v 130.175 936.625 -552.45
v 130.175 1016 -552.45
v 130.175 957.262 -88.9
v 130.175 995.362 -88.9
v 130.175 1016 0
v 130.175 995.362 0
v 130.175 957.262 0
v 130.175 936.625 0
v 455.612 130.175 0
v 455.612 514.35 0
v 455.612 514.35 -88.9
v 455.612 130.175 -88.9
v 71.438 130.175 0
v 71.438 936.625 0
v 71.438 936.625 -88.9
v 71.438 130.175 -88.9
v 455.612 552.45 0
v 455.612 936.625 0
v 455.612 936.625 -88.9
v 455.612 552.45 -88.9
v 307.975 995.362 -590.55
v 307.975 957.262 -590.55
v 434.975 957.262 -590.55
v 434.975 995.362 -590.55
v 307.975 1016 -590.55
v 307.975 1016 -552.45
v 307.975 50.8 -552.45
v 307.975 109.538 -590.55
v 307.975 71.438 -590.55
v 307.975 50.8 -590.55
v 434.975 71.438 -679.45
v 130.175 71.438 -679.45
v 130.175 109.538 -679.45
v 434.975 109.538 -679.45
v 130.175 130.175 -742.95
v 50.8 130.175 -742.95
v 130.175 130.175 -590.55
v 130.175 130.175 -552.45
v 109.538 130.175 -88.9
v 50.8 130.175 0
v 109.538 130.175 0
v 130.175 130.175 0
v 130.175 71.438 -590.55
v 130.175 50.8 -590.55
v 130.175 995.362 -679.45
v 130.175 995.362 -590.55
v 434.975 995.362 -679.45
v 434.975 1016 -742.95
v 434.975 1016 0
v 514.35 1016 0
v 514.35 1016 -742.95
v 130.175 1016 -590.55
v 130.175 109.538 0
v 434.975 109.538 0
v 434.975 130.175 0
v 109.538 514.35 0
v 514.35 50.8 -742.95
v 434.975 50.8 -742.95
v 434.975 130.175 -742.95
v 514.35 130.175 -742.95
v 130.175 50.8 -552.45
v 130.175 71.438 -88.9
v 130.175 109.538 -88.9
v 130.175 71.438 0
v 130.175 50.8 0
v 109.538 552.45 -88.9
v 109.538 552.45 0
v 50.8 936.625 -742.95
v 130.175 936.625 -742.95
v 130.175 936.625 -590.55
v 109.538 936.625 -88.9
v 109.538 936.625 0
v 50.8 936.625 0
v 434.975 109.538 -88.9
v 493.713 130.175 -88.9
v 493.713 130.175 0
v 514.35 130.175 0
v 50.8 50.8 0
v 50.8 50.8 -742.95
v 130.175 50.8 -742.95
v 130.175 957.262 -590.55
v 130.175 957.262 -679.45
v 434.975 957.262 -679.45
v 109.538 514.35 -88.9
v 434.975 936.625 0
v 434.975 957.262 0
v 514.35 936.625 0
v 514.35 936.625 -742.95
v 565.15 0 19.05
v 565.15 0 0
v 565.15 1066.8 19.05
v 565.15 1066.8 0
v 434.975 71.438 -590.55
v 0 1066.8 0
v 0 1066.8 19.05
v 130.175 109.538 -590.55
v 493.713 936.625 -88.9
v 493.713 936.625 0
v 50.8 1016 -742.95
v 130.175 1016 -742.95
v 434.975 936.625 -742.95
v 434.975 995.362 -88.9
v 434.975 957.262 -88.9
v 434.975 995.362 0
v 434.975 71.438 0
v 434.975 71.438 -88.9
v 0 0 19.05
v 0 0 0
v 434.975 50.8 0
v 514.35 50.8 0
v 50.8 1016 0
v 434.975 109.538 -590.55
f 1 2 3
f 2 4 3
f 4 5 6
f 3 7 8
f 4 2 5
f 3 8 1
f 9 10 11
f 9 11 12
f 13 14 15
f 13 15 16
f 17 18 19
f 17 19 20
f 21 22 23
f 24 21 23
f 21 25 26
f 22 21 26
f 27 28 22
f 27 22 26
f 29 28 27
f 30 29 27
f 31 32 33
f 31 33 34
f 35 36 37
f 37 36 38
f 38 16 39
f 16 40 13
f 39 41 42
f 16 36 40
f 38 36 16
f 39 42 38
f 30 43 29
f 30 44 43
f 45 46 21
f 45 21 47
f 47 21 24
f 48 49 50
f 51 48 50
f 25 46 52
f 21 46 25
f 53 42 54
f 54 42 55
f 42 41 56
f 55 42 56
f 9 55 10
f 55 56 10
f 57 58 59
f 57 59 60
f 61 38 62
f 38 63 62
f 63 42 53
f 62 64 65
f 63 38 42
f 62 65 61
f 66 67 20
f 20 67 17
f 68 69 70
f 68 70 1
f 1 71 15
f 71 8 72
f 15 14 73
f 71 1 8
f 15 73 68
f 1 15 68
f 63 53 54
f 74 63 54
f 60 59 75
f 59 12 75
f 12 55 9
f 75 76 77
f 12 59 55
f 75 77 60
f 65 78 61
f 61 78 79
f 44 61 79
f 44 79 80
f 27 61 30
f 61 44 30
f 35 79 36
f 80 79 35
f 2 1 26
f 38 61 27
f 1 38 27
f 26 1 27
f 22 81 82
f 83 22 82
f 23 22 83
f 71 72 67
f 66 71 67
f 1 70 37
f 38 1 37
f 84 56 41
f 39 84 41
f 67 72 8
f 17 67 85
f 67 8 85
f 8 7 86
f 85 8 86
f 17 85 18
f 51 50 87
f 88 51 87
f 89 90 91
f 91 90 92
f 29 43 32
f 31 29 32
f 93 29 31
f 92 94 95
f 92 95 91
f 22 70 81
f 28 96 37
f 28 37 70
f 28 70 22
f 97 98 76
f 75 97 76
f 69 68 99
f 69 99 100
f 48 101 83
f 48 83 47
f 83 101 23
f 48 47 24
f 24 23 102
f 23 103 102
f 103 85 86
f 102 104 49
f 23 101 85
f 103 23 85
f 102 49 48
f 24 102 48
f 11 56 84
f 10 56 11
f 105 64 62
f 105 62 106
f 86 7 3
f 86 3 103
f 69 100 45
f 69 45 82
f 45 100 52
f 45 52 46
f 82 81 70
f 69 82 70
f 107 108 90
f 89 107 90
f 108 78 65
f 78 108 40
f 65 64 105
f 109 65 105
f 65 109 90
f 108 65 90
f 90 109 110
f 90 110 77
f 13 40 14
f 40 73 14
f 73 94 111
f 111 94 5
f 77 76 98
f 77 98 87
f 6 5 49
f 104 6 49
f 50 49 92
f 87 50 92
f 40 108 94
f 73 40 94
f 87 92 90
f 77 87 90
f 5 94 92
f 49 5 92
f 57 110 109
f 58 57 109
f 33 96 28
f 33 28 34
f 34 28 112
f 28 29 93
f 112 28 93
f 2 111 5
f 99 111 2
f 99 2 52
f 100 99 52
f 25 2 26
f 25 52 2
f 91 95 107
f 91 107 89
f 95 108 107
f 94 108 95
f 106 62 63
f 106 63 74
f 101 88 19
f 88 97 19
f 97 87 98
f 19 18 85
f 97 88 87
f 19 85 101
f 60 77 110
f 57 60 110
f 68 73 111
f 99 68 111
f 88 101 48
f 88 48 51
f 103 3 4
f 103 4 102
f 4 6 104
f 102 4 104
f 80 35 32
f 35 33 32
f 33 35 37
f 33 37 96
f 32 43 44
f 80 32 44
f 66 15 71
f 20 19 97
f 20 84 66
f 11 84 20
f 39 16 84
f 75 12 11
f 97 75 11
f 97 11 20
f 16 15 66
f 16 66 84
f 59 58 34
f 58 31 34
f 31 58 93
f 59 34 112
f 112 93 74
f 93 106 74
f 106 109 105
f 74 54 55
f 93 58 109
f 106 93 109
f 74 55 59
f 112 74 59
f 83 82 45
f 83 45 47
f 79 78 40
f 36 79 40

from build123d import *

# Parameters (mm, degrees)
F0_W      = 565.15
F0_H      = 1066.8
F1_DEPTH  = 19.05
F3_DEPTH  = 742.95
F5_W      = 304.8
F5_H      = 38.1
F6_DEPTH  = 88.9
F7_W      = 38.1
F7_H      = 806.45
F8_DEPTH  = 88.9
F9_W      = 346.075
F9_H      = 38.1
F10_DEPTH = 88.9
F12_W     = 304.8
F12_H     = 38.1
F13_DEPTH = 88.9
F14_W     = 177.8
F14_H     = 965.2
F15_DEPTH = 38.1


with BuildPart() as f1:
    # F0 (on Top) → F1 (new body)
    with BuildSketch(Plane.XY):
        with Locations((282.575, 533.4)):
            Rectangle(F0_W, F0_H)
    extrude(amount=F1_DEPTH)

    # F2 (on face) → F3 (join)
    with BuildSketch(Plane(origin=(0, 0, 0), x_dir=(1, 0, 0), z_dir=(0, 0, -1))):
        Polygon((130.175, -1016), (130.175, -976.3125), (130.175, -936.625), (50.8, -936.625), (50.8, -1016), align=None)
        Polygon((514.35, -1016), (514.35, -936.625), (434.975, -936.625), (434.975, -976.3125), (434.975, -1016), align=None)
        Polygon((434.975, -50.8), (434.975, -71.4375), (434.975, -109.5375), (434.975, -130.175), (514.35, -130.175), (514.35, -50.8), align=None)
        Polygon((130.175, -71.4375), (130.175, -50.8), (50.8, -50.8), (50.8, -130.175), (130.175, -130.175), (130.175, -109.5375), align=None)
    extrude(amount=F3_DEPTH)

    # F5 (on face) → F6 (join)
    with BuildSketch(Plane(origin=(0, 0, 0), x_dir=(1, 0, 0), z_dir=(0, 0, -1))):
        with Locations((282.575, -90.4875)):
            Rectangle(F5_W, F5_H)
        with Locations((282.575, -976.3125)):
            Rectangle(F5_W, F5_H)
    extrude(amount=F6_DEPTH)

    # F7 (on face) → F8 (join)
    with BuildSketch(Plane(origin=(0, 0, 0), x_dir=(1, 0, 0), z_dir=(0, 0, -1))):
        with Locations((474.6625, -533.4)):
            Rectangle(F7_W, F7_H)
        with Locations((90.4875, -533.4)):
            Rectangle(F7_W, F7_H)
    extrude(amount=F8_DEPTH)

    # F9 (on face) → F10 (join)
    with BuildSketch(Plane(origin=(0, 0, 0), x_dir=(1, 0, 0), z_dir=(0, 0, -1))):
        with Locations((282.575, -533.4)):
            Rectangle(F9_W, F9_H)
    extrude(amount=F10_DEPTH)

    # F12 (on offset) → F13 (join)
    with BuildSketch(Plane(origin=(0, 0, -590.55), x_dir=(1, 0, 0), z_dir=(0, 0, -1))):
        with Locations((282.575, -90.4875)):
            Rectangle(F12_W, F12_H)
        with Locations((282.575, -976.3125)):
            Rectangle(F12_W, F12_H)
    extrude(amount=F13_DEPTH)

    # F14 (on offset) → F15 (join)
    with BuildSketch(Plane(origin=(0, 0, -590.55), x_dir=(1, 0, 0), z_dir=(0, 0, -1))):
        with Locations((219.075, -533.4)):
            Rectangle(F14_W, F14_H)
    extrude(amount=-F15_DEPTH)


solid = f1.part
